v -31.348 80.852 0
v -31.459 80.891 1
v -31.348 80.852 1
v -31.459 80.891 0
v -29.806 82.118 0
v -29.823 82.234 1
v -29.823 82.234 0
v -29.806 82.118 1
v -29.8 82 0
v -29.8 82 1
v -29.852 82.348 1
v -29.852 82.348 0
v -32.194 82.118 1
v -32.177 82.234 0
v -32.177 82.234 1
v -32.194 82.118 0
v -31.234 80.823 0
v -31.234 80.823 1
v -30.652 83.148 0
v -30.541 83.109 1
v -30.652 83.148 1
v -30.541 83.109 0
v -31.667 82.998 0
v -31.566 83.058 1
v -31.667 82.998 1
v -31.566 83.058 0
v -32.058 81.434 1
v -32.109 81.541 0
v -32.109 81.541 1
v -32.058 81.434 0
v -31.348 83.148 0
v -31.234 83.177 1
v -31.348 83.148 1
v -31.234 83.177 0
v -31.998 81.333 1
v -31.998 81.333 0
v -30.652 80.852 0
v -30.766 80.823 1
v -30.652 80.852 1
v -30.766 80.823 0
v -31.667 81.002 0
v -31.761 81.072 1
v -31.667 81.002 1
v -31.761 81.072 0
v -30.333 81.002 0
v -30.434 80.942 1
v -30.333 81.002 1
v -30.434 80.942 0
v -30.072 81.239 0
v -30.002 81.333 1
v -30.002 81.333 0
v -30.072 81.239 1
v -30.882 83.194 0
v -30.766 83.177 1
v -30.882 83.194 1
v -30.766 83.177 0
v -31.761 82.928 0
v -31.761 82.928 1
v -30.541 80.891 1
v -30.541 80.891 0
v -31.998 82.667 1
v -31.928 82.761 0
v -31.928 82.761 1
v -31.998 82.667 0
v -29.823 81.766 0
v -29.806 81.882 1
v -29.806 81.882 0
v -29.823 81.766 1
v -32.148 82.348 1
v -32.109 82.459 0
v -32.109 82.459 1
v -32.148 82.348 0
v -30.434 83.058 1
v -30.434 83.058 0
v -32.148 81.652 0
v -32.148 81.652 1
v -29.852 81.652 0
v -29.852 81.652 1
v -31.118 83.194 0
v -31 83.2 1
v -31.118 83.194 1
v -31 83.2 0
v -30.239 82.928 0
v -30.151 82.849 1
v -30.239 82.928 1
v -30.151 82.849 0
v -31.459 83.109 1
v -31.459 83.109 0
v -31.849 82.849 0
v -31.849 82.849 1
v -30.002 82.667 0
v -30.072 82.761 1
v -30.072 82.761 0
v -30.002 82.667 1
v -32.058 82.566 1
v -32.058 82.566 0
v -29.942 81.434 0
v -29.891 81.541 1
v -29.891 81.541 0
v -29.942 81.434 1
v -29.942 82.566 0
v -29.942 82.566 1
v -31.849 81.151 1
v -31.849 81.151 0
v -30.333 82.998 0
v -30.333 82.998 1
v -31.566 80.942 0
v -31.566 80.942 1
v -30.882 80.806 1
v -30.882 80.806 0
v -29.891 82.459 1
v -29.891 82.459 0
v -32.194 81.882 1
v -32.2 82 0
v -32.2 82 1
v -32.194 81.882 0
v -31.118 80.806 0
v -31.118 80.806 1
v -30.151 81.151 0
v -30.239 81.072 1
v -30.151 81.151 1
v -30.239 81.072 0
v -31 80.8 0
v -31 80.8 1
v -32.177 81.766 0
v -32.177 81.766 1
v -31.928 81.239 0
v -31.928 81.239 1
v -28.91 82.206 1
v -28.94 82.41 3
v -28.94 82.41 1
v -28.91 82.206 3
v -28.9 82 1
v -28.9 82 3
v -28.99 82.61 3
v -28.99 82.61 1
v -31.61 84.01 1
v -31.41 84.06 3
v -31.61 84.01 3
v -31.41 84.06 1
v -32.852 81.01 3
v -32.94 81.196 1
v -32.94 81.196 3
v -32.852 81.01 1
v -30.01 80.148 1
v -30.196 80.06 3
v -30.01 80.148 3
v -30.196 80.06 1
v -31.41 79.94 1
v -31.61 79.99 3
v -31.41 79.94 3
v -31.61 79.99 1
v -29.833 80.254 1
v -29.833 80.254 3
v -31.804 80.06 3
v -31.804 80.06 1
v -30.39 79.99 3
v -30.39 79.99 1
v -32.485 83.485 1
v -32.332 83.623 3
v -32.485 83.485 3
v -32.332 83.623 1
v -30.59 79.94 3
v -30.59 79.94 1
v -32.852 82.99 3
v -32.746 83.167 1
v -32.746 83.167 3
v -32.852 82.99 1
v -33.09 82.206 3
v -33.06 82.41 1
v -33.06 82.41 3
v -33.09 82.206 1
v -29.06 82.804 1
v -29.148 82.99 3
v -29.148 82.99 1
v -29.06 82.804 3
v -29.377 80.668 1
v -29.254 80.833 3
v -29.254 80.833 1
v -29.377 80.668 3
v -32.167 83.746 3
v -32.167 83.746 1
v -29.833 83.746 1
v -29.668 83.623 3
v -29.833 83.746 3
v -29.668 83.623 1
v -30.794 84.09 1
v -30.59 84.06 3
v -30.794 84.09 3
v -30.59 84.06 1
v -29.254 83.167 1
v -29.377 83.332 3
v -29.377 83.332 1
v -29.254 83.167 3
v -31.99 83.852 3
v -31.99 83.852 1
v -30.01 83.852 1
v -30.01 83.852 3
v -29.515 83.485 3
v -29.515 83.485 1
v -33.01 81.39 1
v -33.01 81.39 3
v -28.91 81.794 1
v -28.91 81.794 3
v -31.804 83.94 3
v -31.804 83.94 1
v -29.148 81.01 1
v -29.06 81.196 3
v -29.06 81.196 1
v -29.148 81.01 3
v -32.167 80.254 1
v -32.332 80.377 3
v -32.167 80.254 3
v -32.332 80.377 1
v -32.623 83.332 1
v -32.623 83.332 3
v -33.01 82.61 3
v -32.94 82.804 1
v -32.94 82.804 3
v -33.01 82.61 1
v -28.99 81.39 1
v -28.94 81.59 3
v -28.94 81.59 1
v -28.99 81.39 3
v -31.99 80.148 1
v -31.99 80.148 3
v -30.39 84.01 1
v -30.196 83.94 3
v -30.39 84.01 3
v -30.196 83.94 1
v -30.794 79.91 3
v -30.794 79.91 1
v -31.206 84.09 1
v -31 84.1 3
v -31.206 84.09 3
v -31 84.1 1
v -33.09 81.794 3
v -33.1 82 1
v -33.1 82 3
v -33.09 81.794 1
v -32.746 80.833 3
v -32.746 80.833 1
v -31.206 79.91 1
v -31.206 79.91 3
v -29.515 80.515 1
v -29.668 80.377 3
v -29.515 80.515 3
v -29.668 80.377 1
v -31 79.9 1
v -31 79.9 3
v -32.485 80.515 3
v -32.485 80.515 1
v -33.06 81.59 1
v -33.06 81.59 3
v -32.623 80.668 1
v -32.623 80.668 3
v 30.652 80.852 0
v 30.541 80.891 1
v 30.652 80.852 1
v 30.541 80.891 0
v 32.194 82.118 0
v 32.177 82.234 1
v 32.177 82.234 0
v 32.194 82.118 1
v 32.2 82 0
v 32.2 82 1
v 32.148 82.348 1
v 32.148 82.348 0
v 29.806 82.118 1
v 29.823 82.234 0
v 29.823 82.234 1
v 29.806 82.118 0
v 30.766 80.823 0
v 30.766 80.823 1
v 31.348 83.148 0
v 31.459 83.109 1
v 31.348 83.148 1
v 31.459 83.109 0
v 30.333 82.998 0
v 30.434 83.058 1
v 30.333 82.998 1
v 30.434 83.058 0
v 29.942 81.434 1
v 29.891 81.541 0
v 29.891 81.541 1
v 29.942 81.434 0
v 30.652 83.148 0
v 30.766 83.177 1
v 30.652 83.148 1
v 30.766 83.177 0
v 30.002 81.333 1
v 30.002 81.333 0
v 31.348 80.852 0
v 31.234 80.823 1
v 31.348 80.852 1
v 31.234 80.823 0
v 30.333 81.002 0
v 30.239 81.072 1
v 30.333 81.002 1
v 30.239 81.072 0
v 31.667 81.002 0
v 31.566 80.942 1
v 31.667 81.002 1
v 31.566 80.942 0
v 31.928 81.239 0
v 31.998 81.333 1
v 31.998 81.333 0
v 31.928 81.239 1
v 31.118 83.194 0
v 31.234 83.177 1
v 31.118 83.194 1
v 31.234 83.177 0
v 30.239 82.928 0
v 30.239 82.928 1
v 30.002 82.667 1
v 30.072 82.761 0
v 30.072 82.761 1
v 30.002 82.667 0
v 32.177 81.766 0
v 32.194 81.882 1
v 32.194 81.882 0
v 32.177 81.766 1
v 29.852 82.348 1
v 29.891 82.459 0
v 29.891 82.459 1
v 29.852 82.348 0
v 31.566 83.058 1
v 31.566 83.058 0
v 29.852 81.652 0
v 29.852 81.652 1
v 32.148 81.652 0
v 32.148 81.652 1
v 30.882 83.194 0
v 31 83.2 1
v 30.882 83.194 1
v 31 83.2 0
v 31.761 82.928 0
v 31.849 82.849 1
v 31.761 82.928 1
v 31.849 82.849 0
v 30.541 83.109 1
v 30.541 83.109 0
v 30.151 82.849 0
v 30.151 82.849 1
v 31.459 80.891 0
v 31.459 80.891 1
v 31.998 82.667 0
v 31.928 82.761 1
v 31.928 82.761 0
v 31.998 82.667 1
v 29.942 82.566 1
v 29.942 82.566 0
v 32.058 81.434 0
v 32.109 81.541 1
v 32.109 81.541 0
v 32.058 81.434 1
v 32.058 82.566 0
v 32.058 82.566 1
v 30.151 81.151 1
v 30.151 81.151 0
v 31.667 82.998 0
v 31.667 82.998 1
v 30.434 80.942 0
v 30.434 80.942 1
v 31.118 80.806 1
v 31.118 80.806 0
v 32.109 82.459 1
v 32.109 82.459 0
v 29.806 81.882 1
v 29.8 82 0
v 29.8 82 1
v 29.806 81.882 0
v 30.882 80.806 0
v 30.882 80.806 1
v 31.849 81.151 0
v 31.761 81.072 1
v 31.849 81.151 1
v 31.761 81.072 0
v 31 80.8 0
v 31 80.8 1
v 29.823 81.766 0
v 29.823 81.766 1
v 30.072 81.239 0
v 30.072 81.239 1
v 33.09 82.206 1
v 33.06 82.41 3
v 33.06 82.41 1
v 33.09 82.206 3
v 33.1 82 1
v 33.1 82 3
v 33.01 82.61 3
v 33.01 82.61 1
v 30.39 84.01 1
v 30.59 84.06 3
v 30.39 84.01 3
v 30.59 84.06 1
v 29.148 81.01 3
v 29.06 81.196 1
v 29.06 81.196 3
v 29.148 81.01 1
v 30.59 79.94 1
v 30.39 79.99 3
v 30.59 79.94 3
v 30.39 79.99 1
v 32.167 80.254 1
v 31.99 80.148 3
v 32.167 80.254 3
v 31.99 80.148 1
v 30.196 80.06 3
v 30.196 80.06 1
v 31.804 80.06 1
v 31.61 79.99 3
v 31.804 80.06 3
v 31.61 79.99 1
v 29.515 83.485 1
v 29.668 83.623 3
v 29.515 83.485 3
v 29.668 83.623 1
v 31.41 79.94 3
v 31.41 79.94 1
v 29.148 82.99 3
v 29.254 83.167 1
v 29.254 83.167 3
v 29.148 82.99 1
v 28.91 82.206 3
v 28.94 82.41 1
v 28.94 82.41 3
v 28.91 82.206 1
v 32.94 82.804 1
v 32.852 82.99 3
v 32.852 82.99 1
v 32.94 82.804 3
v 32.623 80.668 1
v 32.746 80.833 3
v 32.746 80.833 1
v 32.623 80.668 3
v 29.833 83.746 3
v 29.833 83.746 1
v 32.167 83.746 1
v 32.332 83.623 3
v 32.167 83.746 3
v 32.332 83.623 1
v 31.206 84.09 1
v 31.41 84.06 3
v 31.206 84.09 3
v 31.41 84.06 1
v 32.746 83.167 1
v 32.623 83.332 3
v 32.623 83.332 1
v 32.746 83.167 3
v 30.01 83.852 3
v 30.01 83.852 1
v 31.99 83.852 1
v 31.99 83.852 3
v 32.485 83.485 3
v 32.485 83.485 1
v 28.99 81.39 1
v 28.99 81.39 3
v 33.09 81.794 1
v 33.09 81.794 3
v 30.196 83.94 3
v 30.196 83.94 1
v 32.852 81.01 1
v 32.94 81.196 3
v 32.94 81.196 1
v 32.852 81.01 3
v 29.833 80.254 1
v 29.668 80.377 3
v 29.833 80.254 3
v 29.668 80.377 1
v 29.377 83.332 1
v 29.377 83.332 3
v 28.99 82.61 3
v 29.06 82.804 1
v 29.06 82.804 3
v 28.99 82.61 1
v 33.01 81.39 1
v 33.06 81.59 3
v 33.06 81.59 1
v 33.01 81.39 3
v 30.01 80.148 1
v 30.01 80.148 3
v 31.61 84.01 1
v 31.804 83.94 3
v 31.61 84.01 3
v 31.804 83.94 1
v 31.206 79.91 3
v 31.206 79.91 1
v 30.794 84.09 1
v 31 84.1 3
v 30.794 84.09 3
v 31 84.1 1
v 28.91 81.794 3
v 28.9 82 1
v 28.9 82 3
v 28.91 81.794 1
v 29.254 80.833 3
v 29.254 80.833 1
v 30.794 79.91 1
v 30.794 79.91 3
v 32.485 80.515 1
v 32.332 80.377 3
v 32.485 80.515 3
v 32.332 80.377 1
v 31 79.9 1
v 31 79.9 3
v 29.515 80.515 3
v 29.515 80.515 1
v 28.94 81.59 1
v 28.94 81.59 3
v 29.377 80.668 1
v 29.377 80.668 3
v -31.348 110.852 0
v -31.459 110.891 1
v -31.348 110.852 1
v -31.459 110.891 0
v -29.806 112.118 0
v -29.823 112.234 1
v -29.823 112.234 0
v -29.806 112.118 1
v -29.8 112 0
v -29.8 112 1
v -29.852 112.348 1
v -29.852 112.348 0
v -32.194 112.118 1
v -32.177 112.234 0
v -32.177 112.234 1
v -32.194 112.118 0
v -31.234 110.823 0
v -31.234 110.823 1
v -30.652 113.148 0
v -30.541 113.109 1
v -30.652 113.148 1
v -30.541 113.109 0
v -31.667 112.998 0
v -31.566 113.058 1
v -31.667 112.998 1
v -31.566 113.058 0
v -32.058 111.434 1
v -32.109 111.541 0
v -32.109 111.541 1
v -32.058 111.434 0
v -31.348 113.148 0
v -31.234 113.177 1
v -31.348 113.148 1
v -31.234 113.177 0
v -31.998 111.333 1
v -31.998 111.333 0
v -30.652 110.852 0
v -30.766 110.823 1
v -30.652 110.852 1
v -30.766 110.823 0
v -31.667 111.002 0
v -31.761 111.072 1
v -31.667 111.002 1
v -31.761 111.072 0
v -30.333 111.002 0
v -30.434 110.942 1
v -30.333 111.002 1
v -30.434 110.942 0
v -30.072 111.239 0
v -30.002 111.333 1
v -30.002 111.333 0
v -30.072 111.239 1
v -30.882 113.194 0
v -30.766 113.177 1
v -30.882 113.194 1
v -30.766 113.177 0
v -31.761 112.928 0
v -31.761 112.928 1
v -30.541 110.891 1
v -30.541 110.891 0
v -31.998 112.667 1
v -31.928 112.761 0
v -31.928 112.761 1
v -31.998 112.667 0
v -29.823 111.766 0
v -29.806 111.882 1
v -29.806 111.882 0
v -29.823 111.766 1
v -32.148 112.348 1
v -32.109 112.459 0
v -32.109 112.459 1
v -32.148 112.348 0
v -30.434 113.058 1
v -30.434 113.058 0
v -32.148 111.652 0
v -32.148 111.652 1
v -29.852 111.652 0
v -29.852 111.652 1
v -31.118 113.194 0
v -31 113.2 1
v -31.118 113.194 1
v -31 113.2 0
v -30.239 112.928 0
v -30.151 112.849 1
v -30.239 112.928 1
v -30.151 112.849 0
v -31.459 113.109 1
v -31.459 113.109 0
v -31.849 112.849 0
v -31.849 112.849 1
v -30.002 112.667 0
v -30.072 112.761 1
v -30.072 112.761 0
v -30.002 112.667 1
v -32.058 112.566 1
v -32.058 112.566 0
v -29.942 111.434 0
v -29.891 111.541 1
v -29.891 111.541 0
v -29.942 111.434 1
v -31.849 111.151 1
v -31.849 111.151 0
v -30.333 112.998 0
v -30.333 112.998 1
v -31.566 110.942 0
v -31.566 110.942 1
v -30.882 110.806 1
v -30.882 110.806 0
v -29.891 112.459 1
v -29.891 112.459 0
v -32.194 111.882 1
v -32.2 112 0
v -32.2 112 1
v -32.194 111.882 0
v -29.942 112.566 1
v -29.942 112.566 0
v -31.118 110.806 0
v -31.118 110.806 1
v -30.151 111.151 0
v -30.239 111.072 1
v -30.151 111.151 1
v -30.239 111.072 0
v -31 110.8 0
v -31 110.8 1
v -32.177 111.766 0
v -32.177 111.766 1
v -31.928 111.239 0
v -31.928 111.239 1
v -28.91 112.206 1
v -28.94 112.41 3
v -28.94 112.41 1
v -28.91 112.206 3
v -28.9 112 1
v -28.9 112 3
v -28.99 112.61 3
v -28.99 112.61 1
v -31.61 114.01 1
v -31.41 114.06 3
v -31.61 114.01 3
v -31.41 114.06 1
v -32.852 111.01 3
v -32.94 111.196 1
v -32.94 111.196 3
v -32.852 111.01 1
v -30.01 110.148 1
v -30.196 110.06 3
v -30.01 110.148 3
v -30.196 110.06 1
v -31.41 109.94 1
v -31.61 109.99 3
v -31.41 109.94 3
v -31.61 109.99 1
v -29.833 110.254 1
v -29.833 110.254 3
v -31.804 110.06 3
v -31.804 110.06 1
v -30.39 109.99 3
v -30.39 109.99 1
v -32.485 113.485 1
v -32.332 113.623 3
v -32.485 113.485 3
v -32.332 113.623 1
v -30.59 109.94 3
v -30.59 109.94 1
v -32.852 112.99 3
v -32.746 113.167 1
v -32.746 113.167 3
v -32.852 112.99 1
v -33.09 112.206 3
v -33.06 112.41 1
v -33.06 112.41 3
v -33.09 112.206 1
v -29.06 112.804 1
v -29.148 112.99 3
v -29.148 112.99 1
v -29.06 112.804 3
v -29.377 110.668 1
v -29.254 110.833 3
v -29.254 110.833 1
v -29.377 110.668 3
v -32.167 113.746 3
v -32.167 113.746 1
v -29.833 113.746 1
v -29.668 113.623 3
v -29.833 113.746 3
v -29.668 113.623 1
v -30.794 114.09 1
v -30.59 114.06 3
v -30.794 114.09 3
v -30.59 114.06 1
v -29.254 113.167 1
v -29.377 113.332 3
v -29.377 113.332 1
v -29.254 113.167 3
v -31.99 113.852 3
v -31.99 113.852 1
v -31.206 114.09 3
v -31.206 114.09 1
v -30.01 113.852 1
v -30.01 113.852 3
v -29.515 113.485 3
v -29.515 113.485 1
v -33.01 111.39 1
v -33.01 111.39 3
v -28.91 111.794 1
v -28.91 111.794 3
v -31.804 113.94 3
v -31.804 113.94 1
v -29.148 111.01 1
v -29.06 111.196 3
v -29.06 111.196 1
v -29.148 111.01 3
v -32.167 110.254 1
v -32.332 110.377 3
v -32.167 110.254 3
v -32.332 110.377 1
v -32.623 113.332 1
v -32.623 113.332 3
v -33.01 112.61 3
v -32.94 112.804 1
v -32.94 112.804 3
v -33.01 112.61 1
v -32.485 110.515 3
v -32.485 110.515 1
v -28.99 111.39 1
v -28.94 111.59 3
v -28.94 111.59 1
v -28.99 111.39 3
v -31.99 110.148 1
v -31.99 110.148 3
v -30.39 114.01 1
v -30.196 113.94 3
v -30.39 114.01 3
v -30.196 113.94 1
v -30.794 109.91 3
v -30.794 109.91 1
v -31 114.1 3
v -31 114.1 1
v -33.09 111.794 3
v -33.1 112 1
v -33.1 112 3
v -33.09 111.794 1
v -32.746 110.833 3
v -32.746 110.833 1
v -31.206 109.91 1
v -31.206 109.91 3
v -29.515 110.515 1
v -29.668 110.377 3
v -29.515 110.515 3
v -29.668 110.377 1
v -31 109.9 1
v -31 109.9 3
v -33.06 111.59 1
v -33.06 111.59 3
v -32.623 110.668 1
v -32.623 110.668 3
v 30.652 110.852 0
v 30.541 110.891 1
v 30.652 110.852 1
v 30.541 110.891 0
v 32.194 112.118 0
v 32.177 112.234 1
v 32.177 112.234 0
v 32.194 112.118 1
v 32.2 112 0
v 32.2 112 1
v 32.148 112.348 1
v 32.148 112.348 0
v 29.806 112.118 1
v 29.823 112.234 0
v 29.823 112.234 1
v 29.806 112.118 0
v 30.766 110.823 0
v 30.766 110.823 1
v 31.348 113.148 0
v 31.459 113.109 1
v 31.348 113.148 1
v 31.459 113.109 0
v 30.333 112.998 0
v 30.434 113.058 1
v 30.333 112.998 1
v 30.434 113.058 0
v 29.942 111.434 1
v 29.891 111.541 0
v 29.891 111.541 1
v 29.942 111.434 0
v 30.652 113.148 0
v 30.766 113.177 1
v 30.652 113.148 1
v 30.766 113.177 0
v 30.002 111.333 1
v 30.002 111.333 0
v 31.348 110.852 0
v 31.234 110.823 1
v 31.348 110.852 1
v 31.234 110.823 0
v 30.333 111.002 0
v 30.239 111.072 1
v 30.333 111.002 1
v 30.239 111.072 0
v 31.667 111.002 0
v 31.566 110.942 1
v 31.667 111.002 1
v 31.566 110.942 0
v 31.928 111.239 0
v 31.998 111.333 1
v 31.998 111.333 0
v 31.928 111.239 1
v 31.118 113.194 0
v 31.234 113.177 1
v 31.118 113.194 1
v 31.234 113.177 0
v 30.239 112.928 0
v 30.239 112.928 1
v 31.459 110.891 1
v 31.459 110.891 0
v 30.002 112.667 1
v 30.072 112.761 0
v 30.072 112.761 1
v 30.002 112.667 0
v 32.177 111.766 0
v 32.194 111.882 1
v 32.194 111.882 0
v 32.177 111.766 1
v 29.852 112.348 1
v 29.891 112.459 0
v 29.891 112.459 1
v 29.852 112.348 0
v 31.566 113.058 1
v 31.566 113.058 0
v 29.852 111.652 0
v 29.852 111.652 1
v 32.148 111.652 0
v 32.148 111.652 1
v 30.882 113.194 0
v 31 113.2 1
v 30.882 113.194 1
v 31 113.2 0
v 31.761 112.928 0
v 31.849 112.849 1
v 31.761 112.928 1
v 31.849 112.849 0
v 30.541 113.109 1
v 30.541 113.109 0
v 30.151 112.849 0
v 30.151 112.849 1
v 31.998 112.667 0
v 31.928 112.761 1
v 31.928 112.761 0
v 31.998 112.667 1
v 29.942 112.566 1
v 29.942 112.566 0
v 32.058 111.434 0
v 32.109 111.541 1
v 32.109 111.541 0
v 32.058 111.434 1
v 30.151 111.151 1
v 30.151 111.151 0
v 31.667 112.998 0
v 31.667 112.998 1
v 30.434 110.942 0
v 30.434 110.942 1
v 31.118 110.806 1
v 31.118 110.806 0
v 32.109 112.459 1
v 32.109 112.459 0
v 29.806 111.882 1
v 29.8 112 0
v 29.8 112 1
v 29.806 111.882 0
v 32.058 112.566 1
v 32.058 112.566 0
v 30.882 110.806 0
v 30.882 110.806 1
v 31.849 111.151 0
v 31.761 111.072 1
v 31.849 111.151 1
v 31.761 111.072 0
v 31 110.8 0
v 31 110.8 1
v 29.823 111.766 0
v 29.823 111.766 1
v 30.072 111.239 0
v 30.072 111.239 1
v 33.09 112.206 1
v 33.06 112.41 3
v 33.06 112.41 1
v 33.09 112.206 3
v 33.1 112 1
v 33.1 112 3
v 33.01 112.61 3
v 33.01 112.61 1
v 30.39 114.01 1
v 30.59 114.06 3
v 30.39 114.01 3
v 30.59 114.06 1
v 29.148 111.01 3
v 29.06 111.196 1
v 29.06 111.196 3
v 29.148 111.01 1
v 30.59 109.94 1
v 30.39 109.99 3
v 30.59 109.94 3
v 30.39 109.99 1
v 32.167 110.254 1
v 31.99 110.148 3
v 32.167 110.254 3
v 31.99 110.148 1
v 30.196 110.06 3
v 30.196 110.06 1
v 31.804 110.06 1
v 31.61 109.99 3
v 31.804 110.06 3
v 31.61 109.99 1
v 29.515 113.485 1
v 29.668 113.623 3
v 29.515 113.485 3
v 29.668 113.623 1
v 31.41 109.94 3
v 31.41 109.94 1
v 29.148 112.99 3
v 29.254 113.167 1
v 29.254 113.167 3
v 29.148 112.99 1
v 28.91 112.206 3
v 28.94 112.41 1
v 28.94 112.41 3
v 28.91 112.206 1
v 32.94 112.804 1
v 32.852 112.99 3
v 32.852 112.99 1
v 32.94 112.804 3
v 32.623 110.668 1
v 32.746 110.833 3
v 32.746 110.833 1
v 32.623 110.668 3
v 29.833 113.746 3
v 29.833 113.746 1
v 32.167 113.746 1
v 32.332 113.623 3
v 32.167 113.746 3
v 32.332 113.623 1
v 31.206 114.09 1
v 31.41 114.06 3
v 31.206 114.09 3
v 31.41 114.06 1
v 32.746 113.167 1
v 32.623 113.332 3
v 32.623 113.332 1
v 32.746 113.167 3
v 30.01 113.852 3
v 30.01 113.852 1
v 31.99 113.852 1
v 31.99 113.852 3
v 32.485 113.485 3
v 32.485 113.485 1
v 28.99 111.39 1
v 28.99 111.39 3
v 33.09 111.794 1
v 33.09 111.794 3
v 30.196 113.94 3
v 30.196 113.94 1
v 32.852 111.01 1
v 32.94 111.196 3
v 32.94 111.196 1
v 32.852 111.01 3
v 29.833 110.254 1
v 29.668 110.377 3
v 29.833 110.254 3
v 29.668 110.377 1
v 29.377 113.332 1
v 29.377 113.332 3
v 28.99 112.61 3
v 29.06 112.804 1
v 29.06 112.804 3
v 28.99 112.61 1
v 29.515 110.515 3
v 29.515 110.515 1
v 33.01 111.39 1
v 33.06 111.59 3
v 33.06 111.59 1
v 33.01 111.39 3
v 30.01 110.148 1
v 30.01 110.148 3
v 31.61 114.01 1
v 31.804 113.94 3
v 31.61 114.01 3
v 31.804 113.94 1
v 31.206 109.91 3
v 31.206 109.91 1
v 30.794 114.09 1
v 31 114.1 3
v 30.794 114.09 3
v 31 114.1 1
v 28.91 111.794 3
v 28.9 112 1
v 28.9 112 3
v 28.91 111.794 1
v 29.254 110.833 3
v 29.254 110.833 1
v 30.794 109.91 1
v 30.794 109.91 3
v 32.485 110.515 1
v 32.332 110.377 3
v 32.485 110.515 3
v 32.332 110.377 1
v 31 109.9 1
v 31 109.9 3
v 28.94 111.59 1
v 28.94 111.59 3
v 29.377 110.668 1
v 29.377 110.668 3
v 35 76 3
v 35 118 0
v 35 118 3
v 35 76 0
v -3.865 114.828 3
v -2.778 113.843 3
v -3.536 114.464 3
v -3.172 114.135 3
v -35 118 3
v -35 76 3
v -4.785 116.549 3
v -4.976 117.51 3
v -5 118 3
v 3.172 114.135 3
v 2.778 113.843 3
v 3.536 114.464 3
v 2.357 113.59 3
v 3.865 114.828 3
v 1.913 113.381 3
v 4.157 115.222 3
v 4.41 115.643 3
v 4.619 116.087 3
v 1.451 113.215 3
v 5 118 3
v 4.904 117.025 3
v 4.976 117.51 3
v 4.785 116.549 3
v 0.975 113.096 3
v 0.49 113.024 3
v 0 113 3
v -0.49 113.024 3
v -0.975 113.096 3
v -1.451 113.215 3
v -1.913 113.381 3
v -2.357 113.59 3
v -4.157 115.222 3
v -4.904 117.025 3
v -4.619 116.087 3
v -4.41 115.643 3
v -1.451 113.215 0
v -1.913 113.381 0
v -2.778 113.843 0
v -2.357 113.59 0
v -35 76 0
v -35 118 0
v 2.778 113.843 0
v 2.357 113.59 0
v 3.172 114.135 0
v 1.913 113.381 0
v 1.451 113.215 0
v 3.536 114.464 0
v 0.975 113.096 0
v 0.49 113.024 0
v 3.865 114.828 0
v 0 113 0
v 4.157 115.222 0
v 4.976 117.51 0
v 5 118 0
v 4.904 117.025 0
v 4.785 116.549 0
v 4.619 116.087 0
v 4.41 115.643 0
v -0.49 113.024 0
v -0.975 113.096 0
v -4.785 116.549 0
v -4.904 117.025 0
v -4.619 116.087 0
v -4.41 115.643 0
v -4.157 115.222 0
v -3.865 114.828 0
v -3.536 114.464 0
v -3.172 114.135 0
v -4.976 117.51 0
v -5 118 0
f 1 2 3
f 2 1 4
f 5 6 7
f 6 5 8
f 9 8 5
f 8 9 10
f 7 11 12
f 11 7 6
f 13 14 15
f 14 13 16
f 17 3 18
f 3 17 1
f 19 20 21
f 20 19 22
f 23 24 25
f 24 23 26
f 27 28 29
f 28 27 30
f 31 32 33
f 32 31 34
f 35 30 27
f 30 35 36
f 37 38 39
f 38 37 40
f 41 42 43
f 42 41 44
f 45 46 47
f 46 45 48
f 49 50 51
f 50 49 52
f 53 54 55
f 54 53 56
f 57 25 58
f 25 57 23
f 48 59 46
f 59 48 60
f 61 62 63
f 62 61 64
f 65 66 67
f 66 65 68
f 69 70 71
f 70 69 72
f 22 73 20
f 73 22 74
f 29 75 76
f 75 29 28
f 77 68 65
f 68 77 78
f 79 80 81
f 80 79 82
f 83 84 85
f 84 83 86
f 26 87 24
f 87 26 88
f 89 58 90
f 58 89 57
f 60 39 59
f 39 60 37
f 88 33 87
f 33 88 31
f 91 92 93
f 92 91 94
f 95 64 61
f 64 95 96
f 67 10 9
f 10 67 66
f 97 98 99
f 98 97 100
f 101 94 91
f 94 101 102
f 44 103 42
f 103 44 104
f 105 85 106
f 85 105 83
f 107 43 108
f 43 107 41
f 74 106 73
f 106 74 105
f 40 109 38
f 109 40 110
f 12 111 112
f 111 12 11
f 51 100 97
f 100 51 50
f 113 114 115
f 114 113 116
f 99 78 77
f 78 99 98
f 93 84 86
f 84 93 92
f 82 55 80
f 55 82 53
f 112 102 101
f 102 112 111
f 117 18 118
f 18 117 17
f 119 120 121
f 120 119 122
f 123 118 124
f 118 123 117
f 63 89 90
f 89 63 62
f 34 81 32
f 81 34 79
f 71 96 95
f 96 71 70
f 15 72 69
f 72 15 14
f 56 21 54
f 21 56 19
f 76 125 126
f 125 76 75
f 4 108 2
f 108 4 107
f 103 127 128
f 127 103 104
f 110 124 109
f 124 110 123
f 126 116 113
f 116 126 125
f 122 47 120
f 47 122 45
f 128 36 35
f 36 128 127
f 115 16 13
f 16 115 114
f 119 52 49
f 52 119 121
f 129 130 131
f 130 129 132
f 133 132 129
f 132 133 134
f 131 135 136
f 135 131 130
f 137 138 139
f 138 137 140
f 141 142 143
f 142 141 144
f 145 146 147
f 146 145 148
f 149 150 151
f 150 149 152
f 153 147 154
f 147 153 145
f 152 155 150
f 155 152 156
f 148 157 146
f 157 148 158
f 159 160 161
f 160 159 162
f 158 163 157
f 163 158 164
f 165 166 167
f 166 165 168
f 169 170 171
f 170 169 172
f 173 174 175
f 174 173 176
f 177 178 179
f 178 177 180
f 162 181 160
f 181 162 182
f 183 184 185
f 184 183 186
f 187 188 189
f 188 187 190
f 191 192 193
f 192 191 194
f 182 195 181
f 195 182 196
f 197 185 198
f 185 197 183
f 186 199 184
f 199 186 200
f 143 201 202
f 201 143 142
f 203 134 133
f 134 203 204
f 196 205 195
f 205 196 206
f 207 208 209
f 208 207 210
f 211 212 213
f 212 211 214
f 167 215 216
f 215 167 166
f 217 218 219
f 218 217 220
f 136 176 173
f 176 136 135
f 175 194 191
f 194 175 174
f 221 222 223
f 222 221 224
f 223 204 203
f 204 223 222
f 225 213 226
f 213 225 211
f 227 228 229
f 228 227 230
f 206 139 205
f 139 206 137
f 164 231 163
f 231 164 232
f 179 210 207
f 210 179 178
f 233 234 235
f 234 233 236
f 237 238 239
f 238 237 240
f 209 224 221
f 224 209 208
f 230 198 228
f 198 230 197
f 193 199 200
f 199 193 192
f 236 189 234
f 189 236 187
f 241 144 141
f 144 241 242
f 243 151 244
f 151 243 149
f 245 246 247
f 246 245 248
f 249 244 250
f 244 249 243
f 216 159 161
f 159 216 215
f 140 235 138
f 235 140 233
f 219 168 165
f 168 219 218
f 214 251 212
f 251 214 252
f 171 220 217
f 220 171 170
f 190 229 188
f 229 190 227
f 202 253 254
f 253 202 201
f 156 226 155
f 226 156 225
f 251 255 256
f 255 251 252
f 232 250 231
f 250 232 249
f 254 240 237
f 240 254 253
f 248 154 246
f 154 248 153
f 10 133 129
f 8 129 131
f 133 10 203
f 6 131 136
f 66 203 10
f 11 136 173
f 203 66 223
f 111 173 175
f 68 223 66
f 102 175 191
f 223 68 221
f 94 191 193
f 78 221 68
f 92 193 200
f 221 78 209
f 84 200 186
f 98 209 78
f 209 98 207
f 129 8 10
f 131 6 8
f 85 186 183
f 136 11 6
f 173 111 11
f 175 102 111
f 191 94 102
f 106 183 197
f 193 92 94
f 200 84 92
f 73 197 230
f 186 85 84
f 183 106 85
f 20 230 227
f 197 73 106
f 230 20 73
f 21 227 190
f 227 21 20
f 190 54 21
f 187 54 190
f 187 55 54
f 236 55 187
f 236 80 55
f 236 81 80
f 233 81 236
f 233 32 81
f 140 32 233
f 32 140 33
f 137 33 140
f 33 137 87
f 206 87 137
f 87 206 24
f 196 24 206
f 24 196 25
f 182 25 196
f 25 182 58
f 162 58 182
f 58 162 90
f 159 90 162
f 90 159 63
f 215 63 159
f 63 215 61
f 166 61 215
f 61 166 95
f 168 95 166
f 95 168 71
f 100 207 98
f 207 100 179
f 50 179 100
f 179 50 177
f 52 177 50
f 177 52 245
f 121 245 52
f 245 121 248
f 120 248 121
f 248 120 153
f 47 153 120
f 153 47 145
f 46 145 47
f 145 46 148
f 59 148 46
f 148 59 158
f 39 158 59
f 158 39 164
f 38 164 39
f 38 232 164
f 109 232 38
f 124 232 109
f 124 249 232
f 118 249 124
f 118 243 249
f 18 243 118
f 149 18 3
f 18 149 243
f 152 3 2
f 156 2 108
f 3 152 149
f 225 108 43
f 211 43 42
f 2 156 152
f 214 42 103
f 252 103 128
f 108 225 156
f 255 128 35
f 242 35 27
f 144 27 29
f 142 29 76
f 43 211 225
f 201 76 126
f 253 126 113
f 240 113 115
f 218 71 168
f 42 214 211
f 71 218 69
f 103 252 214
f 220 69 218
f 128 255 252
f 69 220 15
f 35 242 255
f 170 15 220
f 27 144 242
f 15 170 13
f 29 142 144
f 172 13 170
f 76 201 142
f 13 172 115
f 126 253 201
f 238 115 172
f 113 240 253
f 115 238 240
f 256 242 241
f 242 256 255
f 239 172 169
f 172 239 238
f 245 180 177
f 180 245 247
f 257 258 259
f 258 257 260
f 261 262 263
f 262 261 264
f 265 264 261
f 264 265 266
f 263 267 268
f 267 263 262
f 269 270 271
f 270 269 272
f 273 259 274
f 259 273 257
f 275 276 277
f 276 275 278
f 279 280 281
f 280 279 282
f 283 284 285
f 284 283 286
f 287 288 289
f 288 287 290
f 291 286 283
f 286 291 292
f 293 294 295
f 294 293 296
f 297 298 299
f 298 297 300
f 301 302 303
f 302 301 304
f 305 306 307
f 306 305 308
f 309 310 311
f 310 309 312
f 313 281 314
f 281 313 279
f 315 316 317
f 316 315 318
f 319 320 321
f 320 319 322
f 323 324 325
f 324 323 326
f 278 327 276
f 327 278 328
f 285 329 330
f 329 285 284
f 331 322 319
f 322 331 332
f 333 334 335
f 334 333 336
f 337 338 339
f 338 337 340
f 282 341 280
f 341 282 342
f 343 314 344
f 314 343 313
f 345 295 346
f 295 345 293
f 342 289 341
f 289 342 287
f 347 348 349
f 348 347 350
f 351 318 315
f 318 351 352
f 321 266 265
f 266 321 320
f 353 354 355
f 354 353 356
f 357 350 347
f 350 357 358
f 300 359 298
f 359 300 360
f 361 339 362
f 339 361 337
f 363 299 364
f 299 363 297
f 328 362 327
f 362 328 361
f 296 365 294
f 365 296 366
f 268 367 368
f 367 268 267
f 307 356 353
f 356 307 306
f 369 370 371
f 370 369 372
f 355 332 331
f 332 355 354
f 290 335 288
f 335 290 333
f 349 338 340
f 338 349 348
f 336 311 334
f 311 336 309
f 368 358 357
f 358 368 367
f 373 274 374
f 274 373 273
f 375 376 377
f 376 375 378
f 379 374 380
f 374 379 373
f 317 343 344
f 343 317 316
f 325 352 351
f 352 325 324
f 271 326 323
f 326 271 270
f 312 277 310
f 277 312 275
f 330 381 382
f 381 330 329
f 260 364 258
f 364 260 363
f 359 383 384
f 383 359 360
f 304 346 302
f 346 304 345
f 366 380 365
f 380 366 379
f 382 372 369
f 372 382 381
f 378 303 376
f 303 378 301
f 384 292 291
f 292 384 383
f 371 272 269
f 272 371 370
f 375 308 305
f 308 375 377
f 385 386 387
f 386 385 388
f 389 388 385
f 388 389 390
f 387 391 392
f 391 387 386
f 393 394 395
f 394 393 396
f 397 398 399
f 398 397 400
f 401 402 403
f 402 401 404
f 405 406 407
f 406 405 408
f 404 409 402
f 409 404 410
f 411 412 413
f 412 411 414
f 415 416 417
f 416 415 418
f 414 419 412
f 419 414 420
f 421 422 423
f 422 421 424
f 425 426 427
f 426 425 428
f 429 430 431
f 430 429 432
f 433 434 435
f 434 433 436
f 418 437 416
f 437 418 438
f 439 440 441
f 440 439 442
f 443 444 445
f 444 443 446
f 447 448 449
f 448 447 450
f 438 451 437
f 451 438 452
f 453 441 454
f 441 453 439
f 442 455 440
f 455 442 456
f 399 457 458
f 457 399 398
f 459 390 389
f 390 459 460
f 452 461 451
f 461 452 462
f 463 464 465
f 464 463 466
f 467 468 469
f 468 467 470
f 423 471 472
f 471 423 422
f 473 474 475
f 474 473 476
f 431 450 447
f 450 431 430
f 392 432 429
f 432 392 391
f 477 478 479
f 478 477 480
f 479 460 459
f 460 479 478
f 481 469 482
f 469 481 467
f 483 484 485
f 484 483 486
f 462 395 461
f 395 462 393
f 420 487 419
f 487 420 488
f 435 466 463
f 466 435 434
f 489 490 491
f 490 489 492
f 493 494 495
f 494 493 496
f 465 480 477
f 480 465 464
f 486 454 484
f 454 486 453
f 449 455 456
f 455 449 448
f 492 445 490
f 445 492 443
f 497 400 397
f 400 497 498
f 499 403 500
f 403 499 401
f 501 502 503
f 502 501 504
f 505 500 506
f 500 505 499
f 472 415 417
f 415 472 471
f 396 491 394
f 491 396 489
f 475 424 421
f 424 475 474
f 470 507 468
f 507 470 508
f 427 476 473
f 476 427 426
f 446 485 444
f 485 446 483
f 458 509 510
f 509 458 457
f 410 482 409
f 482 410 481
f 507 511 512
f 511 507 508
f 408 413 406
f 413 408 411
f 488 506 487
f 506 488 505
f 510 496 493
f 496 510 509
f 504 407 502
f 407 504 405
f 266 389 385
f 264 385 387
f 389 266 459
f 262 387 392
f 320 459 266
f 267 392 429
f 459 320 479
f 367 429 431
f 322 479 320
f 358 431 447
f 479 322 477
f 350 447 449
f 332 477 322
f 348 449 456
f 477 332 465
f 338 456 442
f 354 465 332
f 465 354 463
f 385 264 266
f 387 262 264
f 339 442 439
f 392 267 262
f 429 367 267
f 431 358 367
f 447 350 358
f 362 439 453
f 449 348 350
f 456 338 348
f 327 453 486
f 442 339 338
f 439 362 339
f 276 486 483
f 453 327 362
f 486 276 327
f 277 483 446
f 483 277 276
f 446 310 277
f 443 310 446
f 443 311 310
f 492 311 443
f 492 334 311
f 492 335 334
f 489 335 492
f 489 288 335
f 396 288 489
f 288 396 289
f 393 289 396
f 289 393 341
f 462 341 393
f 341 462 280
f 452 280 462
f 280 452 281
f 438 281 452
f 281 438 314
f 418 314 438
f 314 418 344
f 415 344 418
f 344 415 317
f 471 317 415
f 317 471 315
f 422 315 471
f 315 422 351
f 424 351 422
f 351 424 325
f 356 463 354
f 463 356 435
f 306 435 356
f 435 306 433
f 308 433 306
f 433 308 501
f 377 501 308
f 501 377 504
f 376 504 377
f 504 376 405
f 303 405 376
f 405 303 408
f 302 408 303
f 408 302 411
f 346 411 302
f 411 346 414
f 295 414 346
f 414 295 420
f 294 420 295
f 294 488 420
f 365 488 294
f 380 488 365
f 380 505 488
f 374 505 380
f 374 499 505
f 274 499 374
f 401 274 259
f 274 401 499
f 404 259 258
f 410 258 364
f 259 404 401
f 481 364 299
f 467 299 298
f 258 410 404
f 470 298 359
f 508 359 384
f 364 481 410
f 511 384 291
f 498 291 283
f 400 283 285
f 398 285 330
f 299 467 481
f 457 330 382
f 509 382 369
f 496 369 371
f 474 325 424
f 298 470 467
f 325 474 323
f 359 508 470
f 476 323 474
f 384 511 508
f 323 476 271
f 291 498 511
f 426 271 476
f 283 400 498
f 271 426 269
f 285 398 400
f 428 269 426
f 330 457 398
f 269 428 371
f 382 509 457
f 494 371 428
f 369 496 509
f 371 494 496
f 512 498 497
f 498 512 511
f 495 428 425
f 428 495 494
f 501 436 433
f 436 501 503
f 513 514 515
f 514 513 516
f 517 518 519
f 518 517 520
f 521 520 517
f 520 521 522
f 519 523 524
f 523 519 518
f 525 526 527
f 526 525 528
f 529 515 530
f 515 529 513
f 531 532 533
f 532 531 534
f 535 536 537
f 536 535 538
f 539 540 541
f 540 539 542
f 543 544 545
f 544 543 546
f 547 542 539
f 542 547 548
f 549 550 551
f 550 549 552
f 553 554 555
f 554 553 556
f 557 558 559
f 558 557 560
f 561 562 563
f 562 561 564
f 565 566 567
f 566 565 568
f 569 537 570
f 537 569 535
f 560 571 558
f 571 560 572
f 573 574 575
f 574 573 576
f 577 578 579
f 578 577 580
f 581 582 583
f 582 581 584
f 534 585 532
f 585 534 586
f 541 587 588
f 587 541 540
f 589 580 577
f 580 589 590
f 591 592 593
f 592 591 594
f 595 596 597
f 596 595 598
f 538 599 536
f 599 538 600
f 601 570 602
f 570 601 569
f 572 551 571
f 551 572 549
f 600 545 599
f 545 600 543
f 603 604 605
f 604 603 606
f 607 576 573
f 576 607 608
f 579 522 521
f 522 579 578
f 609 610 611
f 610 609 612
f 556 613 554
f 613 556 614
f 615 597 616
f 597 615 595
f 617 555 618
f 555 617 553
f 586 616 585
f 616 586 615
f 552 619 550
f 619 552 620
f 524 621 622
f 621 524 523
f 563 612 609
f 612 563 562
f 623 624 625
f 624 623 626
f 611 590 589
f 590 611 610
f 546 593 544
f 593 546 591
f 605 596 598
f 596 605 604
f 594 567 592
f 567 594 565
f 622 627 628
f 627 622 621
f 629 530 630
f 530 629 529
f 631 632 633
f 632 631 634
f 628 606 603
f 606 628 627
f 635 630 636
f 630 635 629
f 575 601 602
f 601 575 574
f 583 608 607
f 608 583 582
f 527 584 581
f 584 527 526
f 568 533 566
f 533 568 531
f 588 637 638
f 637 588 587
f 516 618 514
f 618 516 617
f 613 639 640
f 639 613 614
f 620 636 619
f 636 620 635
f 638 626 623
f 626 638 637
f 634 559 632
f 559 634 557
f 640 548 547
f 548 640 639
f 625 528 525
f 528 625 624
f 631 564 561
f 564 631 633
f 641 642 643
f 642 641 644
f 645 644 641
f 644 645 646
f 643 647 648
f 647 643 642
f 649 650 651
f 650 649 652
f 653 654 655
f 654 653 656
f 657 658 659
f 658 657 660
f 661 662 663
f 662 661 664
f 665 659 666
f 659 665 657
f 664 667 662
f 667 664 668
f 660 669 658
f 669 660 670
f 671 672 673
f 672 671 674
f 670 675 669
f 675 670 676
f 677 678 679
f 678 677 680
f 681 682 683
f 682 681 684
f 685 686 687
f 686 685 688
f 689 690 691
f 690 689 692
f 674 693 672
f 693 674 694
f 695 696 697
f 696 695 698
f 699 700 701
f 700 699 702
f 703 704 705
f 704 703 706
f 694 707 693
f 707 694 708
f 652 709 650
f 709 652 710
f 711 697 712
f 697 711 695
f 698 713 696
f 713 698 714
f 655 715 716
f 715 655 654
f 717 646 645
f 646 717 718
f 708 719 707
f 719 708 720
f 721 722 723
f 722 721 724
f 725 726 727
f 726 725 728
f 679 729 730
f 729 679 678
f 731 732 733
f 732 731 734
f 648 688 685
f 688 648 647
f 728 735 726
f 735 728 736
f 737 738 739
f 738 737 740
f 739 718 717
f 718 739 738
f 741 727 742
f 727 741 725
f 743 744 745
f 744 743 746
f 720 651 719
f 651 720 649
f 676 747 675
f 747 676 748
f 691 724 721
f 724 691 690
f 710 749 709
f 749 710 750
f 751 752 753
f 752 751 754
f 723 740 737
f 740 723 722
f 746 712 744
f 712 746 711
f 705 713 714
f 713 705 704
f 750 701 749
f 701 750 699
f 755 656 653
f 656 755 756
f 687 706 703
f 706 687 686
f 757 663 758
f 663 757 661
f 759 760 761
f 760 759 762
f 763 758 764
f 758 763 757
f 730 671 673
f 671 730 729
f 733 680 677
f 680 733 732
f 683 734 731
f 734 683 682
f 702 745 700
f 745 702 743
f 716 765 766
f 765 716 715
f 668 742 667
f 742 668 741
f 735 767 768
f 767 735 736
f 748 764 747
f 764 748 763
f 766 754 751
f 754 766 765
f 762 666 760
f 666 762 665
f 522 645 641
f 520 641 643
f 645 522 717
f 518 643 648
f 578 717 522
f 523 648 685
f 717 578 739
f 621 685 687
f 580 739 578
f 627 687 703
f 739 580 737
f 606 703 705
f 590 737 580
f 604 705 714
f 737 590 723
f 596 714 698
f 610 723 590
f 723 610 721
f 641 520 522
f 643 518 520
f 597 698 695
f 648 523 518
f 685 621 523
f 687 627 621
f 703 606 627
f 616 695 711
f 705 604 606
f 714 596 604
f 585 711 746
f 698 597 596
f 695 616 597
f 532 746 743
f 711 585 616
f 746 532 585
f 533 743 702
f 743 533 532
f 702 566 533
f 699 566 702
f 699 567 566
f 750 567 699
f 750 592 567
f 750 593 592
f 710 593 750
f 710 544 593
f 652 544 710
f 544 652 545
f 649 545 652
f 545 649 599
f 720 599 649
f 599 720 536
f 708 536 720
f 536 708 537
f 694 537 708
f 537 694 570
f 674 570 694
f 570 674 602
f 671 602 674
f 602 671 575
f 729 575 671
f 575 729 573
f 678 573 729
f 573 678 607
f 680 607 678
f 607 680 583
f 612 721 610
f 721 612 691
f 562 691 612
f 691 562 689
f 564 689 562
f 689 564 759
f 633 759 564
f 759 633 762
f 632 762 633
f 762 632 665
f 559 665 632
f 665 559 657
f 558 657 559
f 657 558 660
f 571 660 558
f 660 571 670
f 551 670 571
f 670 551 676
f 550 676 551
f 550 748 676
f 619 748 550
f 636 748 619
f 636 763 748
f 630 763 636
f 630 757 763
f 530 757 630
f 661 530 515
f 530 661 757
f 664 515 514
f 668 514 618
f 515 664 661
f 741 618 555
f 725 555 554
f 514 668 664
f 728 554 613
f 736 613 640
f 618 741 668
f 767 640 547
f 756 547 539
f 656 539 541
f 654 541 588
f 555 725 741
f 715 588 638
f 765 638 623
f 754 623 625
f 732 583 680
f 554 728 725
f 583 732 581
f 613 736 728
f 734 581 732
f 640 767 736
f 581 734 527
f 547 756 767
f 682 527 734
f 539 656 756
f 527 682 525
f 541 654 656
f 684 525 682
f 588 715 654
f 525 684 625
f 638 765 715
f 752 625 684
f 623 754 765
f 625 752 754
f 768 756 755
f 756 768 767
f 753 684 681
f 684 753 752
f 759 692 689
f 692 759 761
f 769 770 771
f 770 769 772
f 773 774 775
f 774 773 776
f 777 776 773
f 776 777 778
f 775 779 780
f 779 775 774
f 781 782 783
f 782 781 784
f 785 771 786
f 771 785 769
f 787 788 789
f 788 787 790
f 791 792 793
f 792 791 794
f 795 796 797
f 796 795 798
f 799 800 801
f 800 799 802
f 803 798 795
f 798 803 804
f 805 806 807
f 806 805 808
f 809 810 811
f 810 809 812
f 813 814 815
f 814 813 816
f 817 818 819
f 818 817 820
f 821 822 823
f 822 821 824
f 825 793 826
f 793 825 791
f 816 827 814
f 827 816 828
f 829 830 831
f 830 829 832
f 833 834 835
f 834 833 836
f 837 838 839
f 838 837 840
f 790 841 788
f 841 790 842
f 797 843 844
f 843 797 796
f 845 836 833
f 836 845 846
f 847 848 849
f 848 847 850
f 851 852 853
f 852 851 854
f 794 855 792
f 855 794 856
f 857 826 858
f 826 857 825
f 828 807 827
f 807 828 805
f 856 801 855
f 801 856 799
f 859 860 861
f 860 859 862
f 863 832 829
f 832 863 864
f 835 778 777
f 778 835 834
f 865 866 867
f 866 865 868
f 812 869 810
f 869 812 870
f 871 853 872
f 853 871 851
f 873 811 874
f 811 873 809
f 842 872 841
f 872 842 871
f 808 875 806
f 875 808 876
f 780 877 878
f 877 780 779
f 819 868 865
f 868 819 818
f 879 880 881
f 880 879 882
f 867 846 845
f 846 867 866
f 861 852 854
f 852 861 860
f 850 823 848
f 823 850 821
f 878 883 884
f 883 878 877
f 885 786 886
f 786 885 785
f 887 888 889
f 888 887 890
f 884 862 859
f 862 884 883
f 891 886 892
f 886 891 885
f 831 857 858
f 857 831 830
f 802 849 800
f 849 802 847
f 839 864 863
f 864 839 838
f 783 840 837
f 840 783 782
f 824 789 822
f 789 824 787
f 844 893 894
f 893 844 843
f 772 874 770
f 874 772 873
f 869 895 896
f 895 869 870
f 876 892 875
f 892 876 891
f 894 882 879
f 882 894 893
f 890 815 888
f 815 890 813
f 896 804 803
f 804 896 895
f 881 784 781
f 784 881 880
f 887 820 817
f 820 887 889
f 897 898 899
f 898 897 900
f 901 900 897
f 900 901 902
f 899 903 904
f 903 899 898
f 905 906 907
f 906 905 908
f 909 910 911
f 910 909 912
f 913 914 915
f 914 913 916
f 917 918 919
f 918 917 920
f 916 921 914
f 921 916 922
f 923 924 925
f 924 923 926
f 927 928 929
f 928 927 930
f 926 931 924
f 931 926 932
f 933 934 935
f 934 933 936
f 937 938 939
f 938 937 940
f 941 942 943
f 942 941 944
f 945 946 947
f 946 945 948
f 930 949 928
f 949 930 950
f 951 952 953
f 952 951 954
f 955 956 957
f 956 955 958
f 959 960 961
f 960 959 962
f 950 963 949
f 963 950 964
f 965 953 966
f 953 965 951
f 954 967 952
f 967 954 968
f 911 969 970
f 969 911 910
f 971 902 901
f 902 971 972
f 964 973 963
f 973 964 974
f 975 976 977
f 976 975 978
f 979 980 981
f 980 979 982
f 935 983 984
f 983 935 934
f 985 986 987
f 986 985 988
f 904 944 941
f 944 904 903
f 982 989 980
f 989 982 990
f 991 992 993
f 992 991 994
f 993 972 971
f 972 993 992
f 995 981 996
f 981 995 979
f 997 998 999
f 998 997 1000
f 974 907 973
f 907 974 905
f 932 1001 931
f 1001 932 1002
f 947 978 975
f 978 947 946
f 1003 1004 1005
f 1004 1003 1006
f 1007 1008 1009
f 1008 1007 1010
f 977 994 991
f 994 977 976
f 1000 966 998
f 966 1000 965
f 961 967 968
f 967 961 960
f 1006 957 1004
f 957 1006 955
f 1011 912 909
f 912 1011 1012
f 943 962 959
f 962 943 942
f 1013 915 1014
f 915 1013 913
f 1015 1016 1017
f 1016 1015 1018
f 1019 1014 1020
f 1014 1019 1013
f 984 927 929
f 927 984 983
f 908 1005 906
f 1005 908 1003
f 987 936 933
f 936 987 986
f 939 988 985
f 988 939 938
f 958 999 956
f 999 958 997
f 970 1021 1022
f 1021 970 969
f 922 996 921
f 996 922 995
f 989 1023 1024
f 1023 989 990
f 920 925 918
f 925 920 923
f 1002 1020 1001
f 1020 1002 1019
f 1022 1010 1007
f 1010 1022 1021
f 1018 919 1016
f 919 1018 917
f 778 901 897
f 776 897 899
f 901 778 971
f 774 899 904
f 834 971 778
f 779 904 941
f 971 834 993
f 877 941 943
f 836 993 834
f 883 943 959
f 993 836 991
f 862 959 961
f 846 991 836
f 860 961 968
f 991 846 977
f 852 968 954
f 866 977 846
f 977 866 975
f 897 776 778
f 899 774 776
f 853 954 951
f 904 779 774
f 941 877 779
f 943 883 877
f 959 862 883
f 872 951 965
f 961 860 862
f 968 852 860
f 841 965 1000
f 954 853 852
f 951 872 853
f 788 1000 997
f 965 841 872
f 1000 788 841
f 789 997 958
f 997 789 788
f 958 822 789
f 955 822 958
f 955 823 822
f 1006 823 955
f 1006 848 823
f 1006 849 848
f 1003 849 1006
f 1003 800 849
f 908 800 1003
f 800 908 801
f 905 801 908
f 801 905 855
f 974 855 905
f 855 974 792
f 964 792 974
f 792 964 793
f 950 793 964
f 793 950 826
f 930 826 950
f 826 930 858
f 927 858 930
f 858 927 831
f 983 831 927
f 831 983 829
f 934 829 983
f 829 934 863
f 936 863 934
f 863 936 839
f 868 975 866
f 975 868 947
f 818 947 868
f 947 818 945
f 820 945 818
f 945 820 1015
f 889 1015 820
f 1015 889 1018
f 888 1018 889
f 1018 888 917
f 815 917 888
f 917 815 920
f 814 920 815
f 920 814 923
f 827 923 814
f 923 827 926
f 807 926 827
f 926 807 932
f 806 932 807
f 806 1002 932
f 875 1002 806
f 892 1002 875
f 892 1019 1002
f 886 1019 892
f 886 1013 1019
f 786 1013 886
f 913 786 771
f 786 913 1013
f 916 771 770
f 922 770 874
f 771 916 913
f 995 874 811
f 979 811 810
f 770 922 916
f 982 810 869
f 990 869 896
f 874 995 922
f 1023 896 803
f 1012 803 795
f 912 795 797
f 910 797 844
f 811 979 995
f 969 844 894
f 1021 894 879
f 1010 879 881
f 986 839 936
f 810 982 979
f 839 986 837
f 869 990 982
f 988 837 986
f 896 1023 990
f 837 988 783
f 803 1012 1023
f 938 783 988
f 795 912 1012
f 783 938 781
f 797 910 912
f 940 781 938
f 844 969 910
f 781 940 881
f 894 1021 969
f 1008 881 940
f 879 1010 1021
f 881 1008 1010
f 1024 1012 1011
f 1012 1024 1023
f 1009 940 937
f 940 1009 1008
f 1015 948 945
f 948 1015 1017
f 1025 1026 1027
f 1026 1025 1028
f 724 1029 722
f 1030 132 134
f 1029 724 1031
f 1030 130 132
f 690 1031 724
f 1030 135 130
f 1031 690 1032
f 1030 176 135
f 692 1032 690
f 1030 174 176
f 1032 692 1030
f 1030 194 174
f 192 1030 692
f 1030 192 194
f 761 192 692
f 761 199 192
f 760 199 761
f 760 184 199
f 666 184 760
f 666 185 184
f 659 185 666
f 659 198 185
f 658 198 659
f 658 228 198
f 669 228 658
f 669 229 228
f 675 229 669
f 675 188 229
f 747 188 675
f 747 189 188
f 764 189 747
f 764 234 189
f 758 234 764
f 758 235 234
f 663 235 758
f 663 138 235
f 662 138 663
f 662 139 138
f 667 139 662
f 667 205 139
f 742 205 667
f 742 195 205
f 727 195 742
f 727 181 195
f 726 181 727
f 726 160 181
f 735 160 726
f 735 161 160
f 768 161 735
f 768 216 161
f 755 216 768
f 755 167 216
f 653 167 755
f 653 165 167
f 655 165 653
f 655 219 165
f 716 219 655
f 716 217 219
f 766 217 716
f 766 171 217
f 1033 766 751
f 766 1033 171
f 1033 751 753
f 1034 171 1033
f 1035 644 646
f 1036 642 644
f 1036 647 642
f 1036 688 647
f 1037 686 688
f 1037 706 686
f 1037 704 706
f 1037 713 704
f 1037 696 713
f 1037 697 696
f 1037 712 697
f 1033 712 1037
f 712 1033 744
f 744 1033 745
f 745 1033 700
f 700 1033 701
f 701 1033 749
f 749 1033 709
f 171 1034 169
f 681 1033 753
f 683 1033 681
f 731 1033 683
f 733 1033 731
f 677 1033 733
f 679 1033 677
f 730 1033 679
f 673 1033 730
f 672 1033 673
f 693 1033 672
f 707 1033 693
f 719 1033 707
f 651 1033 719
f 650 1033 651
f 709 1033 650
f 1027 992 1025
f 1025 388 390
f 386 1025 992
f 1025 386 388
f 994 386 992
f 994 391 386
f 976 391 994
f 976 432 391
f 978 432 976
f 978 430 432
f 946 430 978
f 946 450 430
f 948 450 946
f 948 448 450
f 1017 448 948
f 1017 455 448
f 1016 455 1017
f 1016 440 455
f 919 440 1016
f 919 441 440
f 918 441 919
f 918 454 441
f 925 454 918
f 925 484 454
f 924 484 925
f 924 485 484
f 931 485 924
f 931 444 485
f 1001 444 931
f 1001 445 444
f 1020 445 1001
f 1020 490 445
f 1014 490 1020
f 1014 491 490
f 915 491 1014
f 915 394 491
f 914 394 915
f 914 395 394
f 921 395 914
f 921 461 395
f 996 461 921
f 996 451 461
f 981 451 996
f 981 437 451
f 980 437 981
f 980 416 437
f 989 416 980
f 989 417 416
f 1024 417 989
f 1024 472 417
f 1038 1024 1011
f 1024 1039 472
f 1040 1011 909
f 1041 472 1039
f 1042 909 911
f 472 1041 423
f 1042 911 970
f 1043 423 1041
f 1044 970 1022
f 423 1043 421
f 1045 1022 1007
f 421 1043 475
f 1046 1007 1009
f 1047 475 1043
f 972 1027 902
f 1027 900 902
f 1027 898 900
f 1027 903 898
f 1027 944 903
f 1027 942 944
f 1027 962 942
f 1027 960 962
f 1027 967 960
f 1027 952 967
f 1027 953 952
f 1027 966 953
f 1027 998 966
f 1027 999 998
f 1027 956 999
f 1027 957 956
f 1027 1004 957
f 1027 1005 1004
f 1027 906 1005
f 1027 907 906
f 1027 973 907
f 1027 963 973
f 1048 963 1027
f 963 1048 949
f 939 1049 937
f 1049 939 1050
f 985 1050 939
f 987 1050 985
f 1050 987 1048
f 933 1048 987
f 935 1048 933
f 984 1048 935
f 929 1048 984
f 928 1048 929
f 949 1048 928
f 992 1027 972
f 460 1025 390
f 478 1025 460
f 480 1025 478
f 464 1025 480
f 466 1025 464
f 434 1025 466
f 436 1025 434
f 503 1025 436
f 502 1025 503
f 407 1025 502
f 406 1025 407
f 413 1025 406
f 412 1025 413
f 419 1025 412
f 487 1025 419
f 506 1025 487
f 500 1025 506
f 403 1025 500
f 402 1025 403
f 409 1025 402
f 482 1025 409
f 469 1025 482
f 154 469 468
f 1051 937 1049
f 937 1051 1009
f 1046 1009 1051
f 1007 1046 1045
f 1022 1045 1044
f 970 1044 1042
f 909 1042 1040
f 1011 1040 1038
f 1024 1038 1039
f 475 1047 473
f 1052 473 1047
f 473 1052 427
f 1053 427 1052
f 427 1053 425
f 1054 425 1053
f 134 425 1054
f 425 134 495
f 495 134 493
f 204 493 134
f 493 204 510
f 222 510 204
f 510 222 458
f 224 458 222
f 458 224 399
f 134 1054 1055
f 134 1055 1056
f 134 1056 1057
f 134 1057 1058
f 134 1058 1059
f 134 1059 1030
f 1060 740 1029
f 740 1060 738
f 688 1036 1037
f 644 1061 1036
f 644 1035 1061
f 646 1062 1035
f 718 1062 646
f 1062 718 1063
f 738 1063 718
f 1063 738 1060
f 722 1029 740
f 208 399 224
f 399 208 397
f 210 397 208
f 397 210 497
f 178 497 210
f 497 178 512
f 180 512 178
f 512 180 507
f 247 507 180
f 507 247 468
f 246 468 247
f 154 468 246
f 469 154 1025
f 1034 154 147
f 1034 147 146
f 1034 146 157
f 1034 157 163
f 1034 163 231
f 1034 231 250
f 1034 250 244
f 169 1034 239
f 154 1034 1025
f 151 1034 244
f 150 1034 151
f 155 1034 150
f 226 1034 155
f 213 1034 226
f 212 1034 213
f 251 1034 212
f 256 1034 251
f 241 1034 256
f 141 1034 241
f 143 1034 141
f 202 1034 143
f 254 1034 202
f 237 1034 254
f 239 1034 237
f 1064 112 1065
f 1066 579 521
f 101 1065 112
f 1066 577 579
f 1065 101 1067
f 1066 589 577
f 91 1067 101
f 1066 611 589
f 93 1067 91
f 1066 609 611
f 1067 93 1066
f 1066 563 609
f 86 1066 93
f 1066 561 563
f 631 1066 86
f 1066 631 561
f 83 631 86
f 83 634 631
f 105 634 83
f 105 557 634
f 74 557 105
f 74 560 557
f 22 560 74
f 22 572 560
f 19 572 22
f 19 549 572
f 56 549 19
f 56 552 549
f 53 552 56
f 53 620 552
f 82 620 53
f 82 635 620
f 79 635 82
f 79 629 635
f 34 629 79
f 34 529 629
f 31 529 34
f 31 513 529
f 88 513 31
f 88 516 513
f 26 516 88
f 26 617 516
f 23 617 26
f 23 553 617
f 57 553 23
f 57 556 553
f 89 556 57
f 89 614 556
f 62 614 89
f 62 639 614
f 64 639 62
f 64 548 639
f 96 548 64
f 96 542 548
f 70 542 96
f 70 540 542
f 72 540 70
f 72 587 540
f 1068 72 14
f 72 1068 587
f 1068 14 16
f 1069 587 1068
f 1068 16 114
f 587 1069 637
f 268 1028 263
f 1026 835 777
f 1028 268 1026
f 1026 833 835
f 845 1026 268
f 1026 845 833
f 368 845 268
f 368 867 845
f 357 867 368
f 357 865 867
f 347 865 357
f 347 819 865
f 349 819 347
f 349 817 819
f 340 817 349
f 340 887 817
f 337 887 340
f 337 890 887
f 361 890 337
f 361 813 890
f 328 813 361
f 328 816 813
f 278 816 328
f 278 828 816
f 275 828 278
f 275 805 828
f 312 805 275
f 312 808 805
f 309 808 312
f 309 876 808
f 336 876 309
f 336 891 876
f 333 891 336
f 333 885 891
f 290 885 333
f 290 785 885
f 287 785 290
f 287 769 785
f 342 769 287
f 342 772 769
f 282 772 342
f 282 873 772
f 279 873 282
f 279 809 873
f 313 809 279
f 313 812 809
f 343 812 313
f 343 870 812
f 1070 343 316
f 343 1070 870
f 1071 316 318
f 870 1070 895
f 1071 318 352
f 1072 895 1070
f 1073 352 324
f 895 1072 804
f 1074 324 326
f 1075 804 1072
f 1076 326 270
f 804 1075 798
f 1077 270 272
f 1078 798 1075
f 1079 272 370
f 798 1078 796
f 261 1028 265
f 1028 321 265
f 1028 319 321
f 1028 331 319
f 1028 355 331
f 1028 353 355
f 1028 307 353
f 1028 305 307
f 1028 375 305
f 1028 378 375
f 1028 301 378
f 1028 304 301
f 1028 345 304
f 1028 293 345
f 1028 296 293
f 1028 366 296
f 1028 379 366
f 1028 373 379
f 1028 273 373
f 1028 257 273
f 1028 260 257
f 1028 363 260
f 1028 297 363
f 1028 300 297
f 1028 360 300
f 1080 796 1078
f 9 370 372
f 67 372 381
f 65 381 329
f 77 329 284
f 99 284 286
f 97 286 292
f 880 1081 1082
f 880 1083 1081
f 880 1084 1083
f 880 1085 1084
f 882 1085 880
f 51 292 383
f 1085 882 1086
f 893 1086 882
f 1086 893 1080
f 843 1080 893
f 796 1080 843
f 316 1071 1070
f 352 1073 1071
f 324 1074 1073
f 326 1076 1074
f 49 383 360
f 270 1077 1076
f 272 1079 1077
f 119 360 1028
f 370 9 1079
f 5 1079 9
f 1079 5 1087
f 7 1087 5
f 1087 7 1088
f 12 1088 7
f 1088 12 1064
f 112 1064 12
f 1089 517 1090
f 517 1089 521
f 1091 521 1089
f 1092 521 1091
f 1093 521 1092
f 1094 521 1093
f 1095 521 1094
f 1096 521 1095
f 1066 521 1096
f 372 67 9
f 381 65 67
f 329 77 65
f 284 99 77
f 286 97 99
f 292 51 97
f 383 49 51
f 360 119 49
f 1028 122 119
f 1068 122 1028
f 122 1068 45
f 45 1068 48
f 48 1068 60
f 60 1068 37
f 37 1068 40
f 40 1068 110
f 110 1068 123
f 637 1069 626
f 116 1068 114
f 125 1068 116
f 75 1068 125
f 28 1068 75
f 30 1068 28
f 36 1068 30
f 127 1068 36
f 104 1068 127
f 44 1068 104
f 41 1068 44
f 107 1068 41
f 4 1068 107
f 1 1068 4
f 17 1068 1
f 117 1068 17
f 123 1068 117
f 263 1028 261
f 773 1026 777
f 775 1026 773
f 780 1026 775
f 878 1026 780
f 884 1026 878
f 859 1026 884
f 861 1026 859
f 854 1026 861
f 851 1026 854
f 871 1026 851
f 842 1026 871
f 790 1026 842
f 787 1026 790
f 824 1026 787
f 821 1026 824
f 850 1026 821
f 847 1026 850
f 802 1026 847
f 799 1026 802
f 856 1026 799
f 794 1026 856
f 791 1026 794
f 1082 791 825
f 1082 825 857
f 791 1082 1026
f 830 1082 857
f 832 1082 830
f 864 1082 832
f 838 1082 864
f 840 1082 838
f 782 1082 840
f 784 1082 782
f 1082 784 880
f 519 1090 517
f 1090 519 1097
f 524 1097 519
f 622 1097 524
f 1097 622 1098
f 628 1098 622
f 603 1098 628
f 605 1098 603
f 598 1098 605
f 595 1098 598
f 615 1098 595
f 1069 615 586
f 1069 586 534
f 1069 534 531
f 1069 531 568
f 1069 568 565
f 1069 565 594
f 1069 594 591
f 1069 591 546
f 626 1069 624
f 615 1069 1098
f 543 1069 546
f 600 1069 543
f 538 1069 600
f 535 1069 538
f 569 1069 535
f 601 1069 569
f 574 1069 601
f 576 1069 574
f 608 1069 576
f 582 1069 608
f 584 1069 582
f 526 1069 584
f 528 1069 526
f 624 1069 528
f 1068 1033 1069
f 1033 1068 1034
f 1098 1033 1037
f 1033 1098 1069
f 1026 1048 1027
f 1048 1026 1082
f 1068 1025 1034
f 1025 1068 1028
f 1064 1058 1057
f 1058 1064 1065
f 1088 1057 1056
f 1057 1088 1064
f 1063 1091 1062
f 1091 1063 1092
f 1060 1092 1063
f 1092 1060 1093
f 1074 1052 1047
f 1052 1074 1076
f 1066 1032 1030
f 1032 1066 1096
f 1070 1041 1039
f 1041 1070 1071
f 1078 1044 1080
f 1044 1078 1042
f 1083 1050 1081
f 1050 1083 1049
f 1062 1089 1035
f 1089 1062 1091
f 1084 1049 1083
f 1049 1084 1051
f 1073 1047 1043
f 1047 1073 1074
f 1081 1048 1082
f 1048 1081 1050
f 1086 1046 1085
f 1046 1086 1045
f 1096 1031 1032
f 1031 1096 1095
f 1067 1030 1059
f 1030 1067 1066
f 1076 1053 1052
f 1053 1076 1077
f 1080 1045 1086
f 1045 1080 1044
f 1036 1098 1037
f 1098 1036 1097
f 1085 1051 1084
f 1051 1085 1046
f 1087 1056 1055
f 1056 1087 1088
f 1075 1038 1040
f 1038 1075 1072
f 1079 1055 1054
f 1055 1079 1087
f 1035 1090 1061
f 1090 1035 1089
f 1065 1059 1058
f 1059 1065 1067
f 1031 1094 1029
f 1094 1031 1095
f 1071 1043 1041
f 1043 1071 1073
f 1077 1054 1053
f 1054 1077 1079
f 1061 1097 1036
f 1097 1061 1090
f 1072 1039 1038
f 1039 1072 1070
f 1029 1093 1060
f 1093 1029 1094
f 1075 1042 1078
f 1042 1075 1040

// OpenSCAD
// =====================================================================
//  Tapa para la bandeja del regulador (se atornilla a la base)
//  Fijacion: 4x inserto M2 (en la base) + tornillo M2x4 avellanado.
//  Imprimir plana (avellanados hacia arriba), sin soportes.
// =====================================================================
LID_X = 70;  LID_Y = 42;  LID_T = 3;   // tamaño y espesor de la tapa
lid_yc = 97;                            // centro en Y (coincide con la bandeja)
CB_D = 4.2;  CB_DEPTH = 2;              // avellanado para la cabeza M2
CLR_D = 2.4;                            // paso del vastago M2
WIRE_D = 10;                            // muesca para el cable de alimentacion
ins_pos = [[-31,82],[31,82],[-31,112],[31,112]];
$fn = 64;

difference(){
    translate([-LID_X/2, lid_yc-LID_Y/2, 0]) cube([LID_X,LID_Y,LID_T]);
    for(p=ins_pos){
        translate([p[0],p[1],-1]) cylinder(d=CLR_D, h=LID_T+2);          // paso
        translate([p[0],p[1],LID_T-CB_DEPTH]) cylinder(d=CB_D, h=CB_DEPTH+1); // avellanado
    }
    translate([0,lid_yc+LID_Y/2,-1]) cylinder(d=WIRE_D, h=LID_T+2);      // muesca cable
}
